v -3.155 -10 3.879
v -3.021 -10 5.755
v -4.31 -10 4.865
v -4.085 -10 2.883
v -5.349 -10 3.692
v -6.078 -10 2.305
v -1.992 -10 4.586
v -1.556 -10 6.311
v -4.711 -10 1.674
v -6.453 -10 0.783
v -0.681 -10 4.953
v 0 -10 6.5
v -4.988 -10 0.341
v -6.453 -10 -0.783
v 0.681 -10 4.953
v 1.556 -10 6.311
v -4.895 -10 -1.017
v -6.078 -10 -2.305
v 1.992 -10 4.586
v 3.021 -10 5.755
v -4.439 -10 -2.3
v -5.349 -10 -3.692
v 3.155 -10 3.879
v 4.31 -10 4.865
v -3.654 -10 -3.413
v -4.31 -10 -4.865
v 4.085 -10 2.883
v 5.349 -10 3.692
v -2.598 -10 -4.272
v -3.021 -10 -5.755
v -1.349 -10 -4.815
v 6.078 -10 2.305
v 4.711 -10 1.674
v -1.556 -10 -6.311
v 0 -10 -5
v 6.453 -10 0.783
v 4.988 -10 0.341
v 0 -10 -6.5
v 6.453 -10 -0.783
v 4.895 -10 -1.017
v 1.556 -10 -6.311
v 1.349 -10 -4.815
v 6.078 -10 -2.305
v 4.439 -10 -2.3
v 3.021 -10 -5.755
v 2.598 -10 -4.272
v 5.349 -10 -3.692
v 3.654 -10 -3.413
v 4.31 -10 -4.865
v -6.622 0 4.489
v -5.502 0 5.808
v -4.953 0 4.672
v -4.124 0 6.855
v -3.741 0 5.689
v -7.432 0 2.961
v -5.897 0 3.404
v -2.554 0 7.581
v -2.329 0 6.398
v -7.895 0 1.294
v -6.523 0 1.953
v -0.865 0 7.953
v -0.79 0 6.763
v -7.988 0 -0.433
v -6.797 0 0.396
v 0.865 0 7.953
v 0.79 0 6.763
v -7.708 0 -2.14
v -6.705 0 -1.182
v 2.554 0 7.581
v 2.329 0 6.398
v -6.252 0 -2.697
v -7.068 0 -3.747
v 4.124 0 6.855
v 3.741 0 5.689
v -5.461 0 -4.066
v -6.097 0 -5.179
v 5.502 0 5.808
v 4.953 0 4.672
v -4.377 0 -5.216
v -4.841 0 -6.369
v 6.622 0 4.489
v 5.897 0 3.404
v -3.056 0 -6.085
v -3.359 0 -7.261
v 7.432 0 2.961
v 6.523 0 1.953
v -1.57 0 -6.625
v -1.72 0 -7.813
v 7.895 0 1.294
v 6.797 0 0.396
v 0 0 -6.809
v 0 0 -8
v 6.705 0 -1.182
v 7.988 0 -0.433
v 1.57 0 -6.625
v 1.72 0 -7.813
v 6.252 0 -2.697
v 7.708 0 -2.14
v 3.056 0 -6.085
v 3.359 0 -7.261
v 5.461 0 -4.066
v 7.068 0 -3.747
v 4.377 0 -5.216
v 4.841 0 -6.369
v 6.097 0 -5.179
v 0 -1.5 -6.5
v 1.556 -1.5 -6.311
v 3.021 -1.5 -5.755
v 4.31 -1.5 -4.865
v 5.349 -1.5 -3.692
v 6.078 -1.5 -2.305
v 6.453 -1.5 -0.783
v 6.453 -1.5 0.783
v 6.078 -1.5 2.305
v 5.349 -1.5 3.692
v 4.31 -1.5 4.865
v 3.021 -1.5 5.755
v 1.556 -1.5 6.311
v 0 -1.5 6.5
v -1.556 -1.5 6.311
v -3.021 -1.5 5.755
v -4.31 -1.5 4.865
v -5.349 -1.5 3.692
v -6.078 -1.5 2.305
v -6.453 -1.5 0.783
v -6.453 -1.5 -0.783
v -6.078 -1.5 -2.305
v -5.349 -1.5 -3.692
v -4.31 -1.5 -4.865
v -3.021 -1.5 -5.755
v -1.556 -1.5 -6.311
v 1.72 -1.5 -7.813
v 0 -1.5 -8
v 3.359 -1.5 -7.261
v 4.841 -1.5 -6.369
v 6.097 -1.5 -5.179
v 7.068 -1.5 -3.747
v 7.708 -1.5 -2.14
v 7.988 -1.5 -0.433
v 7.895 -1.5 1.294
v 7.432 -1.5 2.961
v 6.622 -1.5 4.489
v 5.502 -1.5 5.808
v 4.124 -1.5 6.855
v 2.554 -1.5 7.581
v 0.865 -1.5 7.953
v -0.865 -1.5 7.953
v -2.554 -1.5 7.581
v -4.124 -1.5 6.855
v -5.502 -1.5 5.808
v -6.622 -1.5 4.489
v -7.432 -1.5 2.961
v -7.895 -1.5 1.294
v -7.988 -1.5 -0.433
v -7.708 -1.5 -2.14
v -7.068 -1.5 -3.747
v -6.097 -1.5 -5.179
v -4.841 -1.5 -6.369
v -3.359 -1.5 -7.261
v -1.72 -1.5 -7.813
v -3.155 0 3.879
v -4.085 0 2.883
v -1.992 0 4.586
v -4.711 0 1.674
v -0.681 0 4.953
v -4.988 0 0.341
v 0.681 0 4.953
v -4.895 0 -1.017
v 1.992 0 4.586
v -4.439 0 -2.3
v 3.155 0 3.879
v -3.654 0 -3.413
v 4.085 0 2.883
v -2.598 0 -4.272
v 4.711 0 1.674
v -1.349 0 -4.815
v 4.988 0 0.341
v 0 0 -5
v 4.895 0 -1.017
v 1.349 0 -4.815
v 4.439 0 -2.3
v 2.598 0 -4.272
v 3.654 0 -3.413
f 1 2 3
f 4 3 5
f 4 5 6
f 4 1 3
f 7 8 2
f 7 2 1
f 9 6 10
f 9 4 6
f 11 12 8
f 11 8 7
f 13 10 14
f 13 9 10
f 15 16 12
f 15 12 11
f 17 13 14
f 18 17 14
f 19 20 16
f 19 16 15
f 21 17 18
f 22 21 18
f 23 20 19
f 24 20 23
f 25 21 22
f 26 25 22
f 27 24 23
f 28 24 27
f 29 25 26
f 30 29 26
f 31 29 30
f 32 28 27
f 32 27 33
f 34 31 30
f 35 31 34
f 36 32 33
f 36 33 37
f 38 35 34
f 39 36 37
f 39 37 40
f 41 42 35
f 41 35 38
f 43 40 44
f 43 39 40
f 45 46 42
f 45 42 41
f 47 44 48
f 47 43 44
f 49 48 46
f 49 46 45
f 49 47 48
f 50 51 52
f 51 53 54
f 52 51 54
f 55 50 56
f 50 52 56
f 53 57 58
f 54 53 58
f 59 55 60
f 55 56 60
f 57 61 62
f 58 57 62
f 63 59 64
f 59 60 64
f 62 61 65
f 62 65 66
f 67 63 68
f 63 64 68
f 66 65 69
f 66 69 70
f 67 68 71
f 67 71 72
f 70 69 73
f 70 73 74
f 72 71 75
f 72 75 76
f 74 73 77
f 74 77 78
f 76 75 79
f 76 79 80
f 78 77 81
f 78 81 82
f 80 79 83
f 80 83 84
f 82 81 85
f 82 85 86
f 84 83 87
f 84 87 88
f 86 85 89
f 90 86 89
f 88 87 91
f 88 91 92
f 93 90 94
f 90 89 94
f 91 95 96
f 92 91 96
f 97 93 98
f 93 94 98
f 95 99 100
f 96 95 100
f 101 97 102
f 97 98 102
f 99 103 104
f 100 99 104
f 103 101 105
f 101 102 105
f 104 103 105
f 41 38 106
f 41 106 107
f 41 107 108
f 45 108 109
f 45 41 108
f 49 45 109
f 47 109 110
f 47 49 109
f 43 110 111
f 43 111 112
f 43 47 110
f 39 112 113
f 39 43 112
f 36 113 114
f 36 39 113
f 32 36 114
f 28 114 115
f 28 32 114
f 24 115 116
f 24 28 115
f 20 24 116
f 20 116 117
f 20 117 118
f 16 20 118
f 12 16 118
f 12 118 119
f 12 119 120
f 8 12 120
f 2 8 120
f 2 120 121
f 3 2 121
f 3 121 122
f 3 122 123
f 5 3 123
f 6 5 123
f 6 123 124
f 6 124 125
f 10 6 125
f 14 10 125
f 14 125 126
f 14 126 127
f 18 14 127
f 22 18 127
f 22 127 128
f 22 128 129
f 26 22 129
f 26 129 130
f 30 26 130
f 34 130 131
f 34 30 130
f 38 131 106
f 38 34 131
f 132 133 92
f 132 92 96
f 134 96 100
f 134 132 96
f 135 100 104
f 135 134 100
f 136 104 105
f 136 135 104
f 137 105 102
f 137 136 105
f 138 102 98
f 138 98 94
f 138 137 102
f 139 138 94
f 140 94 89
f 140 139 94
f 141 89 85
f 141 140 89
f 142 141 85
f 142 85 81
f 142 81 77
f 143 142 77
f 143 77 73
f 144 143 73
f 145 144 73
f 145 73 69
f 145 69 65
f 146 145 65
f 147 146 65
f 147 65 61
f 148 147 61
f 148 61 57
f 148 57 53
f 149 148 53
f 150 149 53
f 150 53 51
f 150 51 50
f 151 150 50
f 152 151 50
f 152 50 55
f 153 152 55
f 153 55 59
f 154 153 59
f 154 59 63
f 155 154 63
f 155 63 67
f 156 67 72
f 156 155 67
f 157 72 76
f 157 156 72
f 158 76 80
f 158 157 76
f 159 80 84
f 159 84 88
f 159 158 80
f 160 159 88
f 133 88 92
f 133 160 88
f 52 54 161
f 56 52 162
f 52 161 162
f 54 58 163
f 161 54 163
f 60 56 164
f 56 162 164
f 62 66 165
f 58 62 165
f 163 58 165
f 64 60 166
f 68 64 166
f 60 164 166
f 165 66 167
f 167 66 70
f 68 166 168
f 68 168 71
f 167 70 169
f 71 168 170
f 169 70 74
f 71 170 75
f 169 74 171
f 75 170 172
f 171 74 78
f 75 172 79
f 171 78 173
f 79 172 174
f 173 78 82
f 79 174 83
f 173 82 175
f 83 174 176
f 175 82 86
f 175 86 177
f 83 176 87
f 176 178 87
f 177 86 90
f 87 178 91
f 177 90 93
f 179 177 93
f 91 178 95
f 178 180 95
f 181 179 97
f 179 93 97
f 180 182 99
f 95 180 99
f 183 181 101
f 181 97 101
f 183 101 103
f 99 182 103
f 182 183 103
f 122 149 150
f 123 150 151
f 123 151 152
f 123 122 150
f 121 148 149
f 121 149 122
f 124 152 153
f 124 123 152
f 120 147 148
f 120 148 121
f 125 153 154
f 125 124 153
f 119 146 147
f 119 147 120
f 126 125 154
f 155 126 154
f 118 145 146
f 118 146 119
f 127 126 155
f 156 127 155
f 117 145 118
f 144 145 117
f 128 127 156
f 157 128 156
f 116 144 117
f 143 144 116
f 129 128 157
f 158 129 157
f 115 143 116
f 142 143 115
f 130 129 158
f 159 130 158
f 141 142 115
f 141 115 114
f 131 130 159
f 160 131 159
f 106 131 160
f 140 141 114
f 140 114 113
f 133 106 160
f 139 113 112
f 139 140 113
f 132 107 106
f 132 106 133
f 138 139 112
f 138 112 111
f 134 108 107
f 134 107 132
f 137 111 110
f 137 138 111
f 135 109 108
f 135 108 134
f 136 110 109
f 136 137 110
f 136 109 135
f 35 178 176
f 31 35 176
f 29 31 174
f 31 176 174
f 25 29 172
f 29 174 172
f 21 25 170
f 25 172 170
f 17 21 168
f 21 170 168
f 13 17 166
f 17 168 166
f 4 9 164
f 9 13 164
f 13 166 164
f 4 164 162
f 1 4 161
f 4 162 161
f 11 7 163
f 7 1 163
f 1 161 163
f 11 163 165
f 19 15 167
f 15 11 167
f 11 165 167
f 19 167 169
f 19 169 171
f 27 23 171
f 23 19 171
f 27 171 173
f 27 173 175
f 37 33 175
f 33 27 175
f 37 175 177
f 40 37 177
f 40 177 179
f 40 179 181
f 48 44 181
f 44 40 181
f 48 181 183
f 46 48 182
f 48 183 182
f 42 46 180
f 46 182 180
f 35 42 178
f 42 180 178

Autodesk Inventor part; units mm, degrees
ref_plane "YZ Plane" through (0, 0, 0) normal (1, 0, 0) x (0, 1, 0)
ref_plane "XZ Plane" through (0, 0, 0) normal (0, 1, 0) x (-1, 0, 0)
ref_plane "XY Plane" through (0, 0, 0) normal (0, 0, 1) x (1, 0, 0)
sketch "Sketch1" plane through (0, 0, 0) normal (1, 0, 0) x (0, 1, 0)
  line L0 (0, -5) -> (0, -8)
  line L1 (0, -8) -> (-1.5, -8)
  line L2 (-1.5, -8) -> (-1.5, -6.5)
  line L3 (-1.5, -6.5) -> (-10, -6.5)
  line L4 (-10, -6.5) -> (-10, -5)
  line L5 (-10, -5) -> (0, -5)
  line L6 (0, 5.637) -> (0, -6.8088)
  line L7 (5.7696, 0) -> (-13.4996, 0)
  point P0 (0, 0)
  point P1 (0, -0.5859)
  dimension "d0" = 5
  dimension "d2" = 1.5
  dimension "d3" = 10
  dimension "d4" = 1.5
  dimension "d5" = 8
revolve "Revolution1" add sketch "Sketch1" angle 360 about axis through (0, 5.7696, 0) along (0, -1, 0)
equation "\"d2\" = d4"
properties part number "Flange_Sleeve_Bearing_5448T5" material "Bronze, Cast"
